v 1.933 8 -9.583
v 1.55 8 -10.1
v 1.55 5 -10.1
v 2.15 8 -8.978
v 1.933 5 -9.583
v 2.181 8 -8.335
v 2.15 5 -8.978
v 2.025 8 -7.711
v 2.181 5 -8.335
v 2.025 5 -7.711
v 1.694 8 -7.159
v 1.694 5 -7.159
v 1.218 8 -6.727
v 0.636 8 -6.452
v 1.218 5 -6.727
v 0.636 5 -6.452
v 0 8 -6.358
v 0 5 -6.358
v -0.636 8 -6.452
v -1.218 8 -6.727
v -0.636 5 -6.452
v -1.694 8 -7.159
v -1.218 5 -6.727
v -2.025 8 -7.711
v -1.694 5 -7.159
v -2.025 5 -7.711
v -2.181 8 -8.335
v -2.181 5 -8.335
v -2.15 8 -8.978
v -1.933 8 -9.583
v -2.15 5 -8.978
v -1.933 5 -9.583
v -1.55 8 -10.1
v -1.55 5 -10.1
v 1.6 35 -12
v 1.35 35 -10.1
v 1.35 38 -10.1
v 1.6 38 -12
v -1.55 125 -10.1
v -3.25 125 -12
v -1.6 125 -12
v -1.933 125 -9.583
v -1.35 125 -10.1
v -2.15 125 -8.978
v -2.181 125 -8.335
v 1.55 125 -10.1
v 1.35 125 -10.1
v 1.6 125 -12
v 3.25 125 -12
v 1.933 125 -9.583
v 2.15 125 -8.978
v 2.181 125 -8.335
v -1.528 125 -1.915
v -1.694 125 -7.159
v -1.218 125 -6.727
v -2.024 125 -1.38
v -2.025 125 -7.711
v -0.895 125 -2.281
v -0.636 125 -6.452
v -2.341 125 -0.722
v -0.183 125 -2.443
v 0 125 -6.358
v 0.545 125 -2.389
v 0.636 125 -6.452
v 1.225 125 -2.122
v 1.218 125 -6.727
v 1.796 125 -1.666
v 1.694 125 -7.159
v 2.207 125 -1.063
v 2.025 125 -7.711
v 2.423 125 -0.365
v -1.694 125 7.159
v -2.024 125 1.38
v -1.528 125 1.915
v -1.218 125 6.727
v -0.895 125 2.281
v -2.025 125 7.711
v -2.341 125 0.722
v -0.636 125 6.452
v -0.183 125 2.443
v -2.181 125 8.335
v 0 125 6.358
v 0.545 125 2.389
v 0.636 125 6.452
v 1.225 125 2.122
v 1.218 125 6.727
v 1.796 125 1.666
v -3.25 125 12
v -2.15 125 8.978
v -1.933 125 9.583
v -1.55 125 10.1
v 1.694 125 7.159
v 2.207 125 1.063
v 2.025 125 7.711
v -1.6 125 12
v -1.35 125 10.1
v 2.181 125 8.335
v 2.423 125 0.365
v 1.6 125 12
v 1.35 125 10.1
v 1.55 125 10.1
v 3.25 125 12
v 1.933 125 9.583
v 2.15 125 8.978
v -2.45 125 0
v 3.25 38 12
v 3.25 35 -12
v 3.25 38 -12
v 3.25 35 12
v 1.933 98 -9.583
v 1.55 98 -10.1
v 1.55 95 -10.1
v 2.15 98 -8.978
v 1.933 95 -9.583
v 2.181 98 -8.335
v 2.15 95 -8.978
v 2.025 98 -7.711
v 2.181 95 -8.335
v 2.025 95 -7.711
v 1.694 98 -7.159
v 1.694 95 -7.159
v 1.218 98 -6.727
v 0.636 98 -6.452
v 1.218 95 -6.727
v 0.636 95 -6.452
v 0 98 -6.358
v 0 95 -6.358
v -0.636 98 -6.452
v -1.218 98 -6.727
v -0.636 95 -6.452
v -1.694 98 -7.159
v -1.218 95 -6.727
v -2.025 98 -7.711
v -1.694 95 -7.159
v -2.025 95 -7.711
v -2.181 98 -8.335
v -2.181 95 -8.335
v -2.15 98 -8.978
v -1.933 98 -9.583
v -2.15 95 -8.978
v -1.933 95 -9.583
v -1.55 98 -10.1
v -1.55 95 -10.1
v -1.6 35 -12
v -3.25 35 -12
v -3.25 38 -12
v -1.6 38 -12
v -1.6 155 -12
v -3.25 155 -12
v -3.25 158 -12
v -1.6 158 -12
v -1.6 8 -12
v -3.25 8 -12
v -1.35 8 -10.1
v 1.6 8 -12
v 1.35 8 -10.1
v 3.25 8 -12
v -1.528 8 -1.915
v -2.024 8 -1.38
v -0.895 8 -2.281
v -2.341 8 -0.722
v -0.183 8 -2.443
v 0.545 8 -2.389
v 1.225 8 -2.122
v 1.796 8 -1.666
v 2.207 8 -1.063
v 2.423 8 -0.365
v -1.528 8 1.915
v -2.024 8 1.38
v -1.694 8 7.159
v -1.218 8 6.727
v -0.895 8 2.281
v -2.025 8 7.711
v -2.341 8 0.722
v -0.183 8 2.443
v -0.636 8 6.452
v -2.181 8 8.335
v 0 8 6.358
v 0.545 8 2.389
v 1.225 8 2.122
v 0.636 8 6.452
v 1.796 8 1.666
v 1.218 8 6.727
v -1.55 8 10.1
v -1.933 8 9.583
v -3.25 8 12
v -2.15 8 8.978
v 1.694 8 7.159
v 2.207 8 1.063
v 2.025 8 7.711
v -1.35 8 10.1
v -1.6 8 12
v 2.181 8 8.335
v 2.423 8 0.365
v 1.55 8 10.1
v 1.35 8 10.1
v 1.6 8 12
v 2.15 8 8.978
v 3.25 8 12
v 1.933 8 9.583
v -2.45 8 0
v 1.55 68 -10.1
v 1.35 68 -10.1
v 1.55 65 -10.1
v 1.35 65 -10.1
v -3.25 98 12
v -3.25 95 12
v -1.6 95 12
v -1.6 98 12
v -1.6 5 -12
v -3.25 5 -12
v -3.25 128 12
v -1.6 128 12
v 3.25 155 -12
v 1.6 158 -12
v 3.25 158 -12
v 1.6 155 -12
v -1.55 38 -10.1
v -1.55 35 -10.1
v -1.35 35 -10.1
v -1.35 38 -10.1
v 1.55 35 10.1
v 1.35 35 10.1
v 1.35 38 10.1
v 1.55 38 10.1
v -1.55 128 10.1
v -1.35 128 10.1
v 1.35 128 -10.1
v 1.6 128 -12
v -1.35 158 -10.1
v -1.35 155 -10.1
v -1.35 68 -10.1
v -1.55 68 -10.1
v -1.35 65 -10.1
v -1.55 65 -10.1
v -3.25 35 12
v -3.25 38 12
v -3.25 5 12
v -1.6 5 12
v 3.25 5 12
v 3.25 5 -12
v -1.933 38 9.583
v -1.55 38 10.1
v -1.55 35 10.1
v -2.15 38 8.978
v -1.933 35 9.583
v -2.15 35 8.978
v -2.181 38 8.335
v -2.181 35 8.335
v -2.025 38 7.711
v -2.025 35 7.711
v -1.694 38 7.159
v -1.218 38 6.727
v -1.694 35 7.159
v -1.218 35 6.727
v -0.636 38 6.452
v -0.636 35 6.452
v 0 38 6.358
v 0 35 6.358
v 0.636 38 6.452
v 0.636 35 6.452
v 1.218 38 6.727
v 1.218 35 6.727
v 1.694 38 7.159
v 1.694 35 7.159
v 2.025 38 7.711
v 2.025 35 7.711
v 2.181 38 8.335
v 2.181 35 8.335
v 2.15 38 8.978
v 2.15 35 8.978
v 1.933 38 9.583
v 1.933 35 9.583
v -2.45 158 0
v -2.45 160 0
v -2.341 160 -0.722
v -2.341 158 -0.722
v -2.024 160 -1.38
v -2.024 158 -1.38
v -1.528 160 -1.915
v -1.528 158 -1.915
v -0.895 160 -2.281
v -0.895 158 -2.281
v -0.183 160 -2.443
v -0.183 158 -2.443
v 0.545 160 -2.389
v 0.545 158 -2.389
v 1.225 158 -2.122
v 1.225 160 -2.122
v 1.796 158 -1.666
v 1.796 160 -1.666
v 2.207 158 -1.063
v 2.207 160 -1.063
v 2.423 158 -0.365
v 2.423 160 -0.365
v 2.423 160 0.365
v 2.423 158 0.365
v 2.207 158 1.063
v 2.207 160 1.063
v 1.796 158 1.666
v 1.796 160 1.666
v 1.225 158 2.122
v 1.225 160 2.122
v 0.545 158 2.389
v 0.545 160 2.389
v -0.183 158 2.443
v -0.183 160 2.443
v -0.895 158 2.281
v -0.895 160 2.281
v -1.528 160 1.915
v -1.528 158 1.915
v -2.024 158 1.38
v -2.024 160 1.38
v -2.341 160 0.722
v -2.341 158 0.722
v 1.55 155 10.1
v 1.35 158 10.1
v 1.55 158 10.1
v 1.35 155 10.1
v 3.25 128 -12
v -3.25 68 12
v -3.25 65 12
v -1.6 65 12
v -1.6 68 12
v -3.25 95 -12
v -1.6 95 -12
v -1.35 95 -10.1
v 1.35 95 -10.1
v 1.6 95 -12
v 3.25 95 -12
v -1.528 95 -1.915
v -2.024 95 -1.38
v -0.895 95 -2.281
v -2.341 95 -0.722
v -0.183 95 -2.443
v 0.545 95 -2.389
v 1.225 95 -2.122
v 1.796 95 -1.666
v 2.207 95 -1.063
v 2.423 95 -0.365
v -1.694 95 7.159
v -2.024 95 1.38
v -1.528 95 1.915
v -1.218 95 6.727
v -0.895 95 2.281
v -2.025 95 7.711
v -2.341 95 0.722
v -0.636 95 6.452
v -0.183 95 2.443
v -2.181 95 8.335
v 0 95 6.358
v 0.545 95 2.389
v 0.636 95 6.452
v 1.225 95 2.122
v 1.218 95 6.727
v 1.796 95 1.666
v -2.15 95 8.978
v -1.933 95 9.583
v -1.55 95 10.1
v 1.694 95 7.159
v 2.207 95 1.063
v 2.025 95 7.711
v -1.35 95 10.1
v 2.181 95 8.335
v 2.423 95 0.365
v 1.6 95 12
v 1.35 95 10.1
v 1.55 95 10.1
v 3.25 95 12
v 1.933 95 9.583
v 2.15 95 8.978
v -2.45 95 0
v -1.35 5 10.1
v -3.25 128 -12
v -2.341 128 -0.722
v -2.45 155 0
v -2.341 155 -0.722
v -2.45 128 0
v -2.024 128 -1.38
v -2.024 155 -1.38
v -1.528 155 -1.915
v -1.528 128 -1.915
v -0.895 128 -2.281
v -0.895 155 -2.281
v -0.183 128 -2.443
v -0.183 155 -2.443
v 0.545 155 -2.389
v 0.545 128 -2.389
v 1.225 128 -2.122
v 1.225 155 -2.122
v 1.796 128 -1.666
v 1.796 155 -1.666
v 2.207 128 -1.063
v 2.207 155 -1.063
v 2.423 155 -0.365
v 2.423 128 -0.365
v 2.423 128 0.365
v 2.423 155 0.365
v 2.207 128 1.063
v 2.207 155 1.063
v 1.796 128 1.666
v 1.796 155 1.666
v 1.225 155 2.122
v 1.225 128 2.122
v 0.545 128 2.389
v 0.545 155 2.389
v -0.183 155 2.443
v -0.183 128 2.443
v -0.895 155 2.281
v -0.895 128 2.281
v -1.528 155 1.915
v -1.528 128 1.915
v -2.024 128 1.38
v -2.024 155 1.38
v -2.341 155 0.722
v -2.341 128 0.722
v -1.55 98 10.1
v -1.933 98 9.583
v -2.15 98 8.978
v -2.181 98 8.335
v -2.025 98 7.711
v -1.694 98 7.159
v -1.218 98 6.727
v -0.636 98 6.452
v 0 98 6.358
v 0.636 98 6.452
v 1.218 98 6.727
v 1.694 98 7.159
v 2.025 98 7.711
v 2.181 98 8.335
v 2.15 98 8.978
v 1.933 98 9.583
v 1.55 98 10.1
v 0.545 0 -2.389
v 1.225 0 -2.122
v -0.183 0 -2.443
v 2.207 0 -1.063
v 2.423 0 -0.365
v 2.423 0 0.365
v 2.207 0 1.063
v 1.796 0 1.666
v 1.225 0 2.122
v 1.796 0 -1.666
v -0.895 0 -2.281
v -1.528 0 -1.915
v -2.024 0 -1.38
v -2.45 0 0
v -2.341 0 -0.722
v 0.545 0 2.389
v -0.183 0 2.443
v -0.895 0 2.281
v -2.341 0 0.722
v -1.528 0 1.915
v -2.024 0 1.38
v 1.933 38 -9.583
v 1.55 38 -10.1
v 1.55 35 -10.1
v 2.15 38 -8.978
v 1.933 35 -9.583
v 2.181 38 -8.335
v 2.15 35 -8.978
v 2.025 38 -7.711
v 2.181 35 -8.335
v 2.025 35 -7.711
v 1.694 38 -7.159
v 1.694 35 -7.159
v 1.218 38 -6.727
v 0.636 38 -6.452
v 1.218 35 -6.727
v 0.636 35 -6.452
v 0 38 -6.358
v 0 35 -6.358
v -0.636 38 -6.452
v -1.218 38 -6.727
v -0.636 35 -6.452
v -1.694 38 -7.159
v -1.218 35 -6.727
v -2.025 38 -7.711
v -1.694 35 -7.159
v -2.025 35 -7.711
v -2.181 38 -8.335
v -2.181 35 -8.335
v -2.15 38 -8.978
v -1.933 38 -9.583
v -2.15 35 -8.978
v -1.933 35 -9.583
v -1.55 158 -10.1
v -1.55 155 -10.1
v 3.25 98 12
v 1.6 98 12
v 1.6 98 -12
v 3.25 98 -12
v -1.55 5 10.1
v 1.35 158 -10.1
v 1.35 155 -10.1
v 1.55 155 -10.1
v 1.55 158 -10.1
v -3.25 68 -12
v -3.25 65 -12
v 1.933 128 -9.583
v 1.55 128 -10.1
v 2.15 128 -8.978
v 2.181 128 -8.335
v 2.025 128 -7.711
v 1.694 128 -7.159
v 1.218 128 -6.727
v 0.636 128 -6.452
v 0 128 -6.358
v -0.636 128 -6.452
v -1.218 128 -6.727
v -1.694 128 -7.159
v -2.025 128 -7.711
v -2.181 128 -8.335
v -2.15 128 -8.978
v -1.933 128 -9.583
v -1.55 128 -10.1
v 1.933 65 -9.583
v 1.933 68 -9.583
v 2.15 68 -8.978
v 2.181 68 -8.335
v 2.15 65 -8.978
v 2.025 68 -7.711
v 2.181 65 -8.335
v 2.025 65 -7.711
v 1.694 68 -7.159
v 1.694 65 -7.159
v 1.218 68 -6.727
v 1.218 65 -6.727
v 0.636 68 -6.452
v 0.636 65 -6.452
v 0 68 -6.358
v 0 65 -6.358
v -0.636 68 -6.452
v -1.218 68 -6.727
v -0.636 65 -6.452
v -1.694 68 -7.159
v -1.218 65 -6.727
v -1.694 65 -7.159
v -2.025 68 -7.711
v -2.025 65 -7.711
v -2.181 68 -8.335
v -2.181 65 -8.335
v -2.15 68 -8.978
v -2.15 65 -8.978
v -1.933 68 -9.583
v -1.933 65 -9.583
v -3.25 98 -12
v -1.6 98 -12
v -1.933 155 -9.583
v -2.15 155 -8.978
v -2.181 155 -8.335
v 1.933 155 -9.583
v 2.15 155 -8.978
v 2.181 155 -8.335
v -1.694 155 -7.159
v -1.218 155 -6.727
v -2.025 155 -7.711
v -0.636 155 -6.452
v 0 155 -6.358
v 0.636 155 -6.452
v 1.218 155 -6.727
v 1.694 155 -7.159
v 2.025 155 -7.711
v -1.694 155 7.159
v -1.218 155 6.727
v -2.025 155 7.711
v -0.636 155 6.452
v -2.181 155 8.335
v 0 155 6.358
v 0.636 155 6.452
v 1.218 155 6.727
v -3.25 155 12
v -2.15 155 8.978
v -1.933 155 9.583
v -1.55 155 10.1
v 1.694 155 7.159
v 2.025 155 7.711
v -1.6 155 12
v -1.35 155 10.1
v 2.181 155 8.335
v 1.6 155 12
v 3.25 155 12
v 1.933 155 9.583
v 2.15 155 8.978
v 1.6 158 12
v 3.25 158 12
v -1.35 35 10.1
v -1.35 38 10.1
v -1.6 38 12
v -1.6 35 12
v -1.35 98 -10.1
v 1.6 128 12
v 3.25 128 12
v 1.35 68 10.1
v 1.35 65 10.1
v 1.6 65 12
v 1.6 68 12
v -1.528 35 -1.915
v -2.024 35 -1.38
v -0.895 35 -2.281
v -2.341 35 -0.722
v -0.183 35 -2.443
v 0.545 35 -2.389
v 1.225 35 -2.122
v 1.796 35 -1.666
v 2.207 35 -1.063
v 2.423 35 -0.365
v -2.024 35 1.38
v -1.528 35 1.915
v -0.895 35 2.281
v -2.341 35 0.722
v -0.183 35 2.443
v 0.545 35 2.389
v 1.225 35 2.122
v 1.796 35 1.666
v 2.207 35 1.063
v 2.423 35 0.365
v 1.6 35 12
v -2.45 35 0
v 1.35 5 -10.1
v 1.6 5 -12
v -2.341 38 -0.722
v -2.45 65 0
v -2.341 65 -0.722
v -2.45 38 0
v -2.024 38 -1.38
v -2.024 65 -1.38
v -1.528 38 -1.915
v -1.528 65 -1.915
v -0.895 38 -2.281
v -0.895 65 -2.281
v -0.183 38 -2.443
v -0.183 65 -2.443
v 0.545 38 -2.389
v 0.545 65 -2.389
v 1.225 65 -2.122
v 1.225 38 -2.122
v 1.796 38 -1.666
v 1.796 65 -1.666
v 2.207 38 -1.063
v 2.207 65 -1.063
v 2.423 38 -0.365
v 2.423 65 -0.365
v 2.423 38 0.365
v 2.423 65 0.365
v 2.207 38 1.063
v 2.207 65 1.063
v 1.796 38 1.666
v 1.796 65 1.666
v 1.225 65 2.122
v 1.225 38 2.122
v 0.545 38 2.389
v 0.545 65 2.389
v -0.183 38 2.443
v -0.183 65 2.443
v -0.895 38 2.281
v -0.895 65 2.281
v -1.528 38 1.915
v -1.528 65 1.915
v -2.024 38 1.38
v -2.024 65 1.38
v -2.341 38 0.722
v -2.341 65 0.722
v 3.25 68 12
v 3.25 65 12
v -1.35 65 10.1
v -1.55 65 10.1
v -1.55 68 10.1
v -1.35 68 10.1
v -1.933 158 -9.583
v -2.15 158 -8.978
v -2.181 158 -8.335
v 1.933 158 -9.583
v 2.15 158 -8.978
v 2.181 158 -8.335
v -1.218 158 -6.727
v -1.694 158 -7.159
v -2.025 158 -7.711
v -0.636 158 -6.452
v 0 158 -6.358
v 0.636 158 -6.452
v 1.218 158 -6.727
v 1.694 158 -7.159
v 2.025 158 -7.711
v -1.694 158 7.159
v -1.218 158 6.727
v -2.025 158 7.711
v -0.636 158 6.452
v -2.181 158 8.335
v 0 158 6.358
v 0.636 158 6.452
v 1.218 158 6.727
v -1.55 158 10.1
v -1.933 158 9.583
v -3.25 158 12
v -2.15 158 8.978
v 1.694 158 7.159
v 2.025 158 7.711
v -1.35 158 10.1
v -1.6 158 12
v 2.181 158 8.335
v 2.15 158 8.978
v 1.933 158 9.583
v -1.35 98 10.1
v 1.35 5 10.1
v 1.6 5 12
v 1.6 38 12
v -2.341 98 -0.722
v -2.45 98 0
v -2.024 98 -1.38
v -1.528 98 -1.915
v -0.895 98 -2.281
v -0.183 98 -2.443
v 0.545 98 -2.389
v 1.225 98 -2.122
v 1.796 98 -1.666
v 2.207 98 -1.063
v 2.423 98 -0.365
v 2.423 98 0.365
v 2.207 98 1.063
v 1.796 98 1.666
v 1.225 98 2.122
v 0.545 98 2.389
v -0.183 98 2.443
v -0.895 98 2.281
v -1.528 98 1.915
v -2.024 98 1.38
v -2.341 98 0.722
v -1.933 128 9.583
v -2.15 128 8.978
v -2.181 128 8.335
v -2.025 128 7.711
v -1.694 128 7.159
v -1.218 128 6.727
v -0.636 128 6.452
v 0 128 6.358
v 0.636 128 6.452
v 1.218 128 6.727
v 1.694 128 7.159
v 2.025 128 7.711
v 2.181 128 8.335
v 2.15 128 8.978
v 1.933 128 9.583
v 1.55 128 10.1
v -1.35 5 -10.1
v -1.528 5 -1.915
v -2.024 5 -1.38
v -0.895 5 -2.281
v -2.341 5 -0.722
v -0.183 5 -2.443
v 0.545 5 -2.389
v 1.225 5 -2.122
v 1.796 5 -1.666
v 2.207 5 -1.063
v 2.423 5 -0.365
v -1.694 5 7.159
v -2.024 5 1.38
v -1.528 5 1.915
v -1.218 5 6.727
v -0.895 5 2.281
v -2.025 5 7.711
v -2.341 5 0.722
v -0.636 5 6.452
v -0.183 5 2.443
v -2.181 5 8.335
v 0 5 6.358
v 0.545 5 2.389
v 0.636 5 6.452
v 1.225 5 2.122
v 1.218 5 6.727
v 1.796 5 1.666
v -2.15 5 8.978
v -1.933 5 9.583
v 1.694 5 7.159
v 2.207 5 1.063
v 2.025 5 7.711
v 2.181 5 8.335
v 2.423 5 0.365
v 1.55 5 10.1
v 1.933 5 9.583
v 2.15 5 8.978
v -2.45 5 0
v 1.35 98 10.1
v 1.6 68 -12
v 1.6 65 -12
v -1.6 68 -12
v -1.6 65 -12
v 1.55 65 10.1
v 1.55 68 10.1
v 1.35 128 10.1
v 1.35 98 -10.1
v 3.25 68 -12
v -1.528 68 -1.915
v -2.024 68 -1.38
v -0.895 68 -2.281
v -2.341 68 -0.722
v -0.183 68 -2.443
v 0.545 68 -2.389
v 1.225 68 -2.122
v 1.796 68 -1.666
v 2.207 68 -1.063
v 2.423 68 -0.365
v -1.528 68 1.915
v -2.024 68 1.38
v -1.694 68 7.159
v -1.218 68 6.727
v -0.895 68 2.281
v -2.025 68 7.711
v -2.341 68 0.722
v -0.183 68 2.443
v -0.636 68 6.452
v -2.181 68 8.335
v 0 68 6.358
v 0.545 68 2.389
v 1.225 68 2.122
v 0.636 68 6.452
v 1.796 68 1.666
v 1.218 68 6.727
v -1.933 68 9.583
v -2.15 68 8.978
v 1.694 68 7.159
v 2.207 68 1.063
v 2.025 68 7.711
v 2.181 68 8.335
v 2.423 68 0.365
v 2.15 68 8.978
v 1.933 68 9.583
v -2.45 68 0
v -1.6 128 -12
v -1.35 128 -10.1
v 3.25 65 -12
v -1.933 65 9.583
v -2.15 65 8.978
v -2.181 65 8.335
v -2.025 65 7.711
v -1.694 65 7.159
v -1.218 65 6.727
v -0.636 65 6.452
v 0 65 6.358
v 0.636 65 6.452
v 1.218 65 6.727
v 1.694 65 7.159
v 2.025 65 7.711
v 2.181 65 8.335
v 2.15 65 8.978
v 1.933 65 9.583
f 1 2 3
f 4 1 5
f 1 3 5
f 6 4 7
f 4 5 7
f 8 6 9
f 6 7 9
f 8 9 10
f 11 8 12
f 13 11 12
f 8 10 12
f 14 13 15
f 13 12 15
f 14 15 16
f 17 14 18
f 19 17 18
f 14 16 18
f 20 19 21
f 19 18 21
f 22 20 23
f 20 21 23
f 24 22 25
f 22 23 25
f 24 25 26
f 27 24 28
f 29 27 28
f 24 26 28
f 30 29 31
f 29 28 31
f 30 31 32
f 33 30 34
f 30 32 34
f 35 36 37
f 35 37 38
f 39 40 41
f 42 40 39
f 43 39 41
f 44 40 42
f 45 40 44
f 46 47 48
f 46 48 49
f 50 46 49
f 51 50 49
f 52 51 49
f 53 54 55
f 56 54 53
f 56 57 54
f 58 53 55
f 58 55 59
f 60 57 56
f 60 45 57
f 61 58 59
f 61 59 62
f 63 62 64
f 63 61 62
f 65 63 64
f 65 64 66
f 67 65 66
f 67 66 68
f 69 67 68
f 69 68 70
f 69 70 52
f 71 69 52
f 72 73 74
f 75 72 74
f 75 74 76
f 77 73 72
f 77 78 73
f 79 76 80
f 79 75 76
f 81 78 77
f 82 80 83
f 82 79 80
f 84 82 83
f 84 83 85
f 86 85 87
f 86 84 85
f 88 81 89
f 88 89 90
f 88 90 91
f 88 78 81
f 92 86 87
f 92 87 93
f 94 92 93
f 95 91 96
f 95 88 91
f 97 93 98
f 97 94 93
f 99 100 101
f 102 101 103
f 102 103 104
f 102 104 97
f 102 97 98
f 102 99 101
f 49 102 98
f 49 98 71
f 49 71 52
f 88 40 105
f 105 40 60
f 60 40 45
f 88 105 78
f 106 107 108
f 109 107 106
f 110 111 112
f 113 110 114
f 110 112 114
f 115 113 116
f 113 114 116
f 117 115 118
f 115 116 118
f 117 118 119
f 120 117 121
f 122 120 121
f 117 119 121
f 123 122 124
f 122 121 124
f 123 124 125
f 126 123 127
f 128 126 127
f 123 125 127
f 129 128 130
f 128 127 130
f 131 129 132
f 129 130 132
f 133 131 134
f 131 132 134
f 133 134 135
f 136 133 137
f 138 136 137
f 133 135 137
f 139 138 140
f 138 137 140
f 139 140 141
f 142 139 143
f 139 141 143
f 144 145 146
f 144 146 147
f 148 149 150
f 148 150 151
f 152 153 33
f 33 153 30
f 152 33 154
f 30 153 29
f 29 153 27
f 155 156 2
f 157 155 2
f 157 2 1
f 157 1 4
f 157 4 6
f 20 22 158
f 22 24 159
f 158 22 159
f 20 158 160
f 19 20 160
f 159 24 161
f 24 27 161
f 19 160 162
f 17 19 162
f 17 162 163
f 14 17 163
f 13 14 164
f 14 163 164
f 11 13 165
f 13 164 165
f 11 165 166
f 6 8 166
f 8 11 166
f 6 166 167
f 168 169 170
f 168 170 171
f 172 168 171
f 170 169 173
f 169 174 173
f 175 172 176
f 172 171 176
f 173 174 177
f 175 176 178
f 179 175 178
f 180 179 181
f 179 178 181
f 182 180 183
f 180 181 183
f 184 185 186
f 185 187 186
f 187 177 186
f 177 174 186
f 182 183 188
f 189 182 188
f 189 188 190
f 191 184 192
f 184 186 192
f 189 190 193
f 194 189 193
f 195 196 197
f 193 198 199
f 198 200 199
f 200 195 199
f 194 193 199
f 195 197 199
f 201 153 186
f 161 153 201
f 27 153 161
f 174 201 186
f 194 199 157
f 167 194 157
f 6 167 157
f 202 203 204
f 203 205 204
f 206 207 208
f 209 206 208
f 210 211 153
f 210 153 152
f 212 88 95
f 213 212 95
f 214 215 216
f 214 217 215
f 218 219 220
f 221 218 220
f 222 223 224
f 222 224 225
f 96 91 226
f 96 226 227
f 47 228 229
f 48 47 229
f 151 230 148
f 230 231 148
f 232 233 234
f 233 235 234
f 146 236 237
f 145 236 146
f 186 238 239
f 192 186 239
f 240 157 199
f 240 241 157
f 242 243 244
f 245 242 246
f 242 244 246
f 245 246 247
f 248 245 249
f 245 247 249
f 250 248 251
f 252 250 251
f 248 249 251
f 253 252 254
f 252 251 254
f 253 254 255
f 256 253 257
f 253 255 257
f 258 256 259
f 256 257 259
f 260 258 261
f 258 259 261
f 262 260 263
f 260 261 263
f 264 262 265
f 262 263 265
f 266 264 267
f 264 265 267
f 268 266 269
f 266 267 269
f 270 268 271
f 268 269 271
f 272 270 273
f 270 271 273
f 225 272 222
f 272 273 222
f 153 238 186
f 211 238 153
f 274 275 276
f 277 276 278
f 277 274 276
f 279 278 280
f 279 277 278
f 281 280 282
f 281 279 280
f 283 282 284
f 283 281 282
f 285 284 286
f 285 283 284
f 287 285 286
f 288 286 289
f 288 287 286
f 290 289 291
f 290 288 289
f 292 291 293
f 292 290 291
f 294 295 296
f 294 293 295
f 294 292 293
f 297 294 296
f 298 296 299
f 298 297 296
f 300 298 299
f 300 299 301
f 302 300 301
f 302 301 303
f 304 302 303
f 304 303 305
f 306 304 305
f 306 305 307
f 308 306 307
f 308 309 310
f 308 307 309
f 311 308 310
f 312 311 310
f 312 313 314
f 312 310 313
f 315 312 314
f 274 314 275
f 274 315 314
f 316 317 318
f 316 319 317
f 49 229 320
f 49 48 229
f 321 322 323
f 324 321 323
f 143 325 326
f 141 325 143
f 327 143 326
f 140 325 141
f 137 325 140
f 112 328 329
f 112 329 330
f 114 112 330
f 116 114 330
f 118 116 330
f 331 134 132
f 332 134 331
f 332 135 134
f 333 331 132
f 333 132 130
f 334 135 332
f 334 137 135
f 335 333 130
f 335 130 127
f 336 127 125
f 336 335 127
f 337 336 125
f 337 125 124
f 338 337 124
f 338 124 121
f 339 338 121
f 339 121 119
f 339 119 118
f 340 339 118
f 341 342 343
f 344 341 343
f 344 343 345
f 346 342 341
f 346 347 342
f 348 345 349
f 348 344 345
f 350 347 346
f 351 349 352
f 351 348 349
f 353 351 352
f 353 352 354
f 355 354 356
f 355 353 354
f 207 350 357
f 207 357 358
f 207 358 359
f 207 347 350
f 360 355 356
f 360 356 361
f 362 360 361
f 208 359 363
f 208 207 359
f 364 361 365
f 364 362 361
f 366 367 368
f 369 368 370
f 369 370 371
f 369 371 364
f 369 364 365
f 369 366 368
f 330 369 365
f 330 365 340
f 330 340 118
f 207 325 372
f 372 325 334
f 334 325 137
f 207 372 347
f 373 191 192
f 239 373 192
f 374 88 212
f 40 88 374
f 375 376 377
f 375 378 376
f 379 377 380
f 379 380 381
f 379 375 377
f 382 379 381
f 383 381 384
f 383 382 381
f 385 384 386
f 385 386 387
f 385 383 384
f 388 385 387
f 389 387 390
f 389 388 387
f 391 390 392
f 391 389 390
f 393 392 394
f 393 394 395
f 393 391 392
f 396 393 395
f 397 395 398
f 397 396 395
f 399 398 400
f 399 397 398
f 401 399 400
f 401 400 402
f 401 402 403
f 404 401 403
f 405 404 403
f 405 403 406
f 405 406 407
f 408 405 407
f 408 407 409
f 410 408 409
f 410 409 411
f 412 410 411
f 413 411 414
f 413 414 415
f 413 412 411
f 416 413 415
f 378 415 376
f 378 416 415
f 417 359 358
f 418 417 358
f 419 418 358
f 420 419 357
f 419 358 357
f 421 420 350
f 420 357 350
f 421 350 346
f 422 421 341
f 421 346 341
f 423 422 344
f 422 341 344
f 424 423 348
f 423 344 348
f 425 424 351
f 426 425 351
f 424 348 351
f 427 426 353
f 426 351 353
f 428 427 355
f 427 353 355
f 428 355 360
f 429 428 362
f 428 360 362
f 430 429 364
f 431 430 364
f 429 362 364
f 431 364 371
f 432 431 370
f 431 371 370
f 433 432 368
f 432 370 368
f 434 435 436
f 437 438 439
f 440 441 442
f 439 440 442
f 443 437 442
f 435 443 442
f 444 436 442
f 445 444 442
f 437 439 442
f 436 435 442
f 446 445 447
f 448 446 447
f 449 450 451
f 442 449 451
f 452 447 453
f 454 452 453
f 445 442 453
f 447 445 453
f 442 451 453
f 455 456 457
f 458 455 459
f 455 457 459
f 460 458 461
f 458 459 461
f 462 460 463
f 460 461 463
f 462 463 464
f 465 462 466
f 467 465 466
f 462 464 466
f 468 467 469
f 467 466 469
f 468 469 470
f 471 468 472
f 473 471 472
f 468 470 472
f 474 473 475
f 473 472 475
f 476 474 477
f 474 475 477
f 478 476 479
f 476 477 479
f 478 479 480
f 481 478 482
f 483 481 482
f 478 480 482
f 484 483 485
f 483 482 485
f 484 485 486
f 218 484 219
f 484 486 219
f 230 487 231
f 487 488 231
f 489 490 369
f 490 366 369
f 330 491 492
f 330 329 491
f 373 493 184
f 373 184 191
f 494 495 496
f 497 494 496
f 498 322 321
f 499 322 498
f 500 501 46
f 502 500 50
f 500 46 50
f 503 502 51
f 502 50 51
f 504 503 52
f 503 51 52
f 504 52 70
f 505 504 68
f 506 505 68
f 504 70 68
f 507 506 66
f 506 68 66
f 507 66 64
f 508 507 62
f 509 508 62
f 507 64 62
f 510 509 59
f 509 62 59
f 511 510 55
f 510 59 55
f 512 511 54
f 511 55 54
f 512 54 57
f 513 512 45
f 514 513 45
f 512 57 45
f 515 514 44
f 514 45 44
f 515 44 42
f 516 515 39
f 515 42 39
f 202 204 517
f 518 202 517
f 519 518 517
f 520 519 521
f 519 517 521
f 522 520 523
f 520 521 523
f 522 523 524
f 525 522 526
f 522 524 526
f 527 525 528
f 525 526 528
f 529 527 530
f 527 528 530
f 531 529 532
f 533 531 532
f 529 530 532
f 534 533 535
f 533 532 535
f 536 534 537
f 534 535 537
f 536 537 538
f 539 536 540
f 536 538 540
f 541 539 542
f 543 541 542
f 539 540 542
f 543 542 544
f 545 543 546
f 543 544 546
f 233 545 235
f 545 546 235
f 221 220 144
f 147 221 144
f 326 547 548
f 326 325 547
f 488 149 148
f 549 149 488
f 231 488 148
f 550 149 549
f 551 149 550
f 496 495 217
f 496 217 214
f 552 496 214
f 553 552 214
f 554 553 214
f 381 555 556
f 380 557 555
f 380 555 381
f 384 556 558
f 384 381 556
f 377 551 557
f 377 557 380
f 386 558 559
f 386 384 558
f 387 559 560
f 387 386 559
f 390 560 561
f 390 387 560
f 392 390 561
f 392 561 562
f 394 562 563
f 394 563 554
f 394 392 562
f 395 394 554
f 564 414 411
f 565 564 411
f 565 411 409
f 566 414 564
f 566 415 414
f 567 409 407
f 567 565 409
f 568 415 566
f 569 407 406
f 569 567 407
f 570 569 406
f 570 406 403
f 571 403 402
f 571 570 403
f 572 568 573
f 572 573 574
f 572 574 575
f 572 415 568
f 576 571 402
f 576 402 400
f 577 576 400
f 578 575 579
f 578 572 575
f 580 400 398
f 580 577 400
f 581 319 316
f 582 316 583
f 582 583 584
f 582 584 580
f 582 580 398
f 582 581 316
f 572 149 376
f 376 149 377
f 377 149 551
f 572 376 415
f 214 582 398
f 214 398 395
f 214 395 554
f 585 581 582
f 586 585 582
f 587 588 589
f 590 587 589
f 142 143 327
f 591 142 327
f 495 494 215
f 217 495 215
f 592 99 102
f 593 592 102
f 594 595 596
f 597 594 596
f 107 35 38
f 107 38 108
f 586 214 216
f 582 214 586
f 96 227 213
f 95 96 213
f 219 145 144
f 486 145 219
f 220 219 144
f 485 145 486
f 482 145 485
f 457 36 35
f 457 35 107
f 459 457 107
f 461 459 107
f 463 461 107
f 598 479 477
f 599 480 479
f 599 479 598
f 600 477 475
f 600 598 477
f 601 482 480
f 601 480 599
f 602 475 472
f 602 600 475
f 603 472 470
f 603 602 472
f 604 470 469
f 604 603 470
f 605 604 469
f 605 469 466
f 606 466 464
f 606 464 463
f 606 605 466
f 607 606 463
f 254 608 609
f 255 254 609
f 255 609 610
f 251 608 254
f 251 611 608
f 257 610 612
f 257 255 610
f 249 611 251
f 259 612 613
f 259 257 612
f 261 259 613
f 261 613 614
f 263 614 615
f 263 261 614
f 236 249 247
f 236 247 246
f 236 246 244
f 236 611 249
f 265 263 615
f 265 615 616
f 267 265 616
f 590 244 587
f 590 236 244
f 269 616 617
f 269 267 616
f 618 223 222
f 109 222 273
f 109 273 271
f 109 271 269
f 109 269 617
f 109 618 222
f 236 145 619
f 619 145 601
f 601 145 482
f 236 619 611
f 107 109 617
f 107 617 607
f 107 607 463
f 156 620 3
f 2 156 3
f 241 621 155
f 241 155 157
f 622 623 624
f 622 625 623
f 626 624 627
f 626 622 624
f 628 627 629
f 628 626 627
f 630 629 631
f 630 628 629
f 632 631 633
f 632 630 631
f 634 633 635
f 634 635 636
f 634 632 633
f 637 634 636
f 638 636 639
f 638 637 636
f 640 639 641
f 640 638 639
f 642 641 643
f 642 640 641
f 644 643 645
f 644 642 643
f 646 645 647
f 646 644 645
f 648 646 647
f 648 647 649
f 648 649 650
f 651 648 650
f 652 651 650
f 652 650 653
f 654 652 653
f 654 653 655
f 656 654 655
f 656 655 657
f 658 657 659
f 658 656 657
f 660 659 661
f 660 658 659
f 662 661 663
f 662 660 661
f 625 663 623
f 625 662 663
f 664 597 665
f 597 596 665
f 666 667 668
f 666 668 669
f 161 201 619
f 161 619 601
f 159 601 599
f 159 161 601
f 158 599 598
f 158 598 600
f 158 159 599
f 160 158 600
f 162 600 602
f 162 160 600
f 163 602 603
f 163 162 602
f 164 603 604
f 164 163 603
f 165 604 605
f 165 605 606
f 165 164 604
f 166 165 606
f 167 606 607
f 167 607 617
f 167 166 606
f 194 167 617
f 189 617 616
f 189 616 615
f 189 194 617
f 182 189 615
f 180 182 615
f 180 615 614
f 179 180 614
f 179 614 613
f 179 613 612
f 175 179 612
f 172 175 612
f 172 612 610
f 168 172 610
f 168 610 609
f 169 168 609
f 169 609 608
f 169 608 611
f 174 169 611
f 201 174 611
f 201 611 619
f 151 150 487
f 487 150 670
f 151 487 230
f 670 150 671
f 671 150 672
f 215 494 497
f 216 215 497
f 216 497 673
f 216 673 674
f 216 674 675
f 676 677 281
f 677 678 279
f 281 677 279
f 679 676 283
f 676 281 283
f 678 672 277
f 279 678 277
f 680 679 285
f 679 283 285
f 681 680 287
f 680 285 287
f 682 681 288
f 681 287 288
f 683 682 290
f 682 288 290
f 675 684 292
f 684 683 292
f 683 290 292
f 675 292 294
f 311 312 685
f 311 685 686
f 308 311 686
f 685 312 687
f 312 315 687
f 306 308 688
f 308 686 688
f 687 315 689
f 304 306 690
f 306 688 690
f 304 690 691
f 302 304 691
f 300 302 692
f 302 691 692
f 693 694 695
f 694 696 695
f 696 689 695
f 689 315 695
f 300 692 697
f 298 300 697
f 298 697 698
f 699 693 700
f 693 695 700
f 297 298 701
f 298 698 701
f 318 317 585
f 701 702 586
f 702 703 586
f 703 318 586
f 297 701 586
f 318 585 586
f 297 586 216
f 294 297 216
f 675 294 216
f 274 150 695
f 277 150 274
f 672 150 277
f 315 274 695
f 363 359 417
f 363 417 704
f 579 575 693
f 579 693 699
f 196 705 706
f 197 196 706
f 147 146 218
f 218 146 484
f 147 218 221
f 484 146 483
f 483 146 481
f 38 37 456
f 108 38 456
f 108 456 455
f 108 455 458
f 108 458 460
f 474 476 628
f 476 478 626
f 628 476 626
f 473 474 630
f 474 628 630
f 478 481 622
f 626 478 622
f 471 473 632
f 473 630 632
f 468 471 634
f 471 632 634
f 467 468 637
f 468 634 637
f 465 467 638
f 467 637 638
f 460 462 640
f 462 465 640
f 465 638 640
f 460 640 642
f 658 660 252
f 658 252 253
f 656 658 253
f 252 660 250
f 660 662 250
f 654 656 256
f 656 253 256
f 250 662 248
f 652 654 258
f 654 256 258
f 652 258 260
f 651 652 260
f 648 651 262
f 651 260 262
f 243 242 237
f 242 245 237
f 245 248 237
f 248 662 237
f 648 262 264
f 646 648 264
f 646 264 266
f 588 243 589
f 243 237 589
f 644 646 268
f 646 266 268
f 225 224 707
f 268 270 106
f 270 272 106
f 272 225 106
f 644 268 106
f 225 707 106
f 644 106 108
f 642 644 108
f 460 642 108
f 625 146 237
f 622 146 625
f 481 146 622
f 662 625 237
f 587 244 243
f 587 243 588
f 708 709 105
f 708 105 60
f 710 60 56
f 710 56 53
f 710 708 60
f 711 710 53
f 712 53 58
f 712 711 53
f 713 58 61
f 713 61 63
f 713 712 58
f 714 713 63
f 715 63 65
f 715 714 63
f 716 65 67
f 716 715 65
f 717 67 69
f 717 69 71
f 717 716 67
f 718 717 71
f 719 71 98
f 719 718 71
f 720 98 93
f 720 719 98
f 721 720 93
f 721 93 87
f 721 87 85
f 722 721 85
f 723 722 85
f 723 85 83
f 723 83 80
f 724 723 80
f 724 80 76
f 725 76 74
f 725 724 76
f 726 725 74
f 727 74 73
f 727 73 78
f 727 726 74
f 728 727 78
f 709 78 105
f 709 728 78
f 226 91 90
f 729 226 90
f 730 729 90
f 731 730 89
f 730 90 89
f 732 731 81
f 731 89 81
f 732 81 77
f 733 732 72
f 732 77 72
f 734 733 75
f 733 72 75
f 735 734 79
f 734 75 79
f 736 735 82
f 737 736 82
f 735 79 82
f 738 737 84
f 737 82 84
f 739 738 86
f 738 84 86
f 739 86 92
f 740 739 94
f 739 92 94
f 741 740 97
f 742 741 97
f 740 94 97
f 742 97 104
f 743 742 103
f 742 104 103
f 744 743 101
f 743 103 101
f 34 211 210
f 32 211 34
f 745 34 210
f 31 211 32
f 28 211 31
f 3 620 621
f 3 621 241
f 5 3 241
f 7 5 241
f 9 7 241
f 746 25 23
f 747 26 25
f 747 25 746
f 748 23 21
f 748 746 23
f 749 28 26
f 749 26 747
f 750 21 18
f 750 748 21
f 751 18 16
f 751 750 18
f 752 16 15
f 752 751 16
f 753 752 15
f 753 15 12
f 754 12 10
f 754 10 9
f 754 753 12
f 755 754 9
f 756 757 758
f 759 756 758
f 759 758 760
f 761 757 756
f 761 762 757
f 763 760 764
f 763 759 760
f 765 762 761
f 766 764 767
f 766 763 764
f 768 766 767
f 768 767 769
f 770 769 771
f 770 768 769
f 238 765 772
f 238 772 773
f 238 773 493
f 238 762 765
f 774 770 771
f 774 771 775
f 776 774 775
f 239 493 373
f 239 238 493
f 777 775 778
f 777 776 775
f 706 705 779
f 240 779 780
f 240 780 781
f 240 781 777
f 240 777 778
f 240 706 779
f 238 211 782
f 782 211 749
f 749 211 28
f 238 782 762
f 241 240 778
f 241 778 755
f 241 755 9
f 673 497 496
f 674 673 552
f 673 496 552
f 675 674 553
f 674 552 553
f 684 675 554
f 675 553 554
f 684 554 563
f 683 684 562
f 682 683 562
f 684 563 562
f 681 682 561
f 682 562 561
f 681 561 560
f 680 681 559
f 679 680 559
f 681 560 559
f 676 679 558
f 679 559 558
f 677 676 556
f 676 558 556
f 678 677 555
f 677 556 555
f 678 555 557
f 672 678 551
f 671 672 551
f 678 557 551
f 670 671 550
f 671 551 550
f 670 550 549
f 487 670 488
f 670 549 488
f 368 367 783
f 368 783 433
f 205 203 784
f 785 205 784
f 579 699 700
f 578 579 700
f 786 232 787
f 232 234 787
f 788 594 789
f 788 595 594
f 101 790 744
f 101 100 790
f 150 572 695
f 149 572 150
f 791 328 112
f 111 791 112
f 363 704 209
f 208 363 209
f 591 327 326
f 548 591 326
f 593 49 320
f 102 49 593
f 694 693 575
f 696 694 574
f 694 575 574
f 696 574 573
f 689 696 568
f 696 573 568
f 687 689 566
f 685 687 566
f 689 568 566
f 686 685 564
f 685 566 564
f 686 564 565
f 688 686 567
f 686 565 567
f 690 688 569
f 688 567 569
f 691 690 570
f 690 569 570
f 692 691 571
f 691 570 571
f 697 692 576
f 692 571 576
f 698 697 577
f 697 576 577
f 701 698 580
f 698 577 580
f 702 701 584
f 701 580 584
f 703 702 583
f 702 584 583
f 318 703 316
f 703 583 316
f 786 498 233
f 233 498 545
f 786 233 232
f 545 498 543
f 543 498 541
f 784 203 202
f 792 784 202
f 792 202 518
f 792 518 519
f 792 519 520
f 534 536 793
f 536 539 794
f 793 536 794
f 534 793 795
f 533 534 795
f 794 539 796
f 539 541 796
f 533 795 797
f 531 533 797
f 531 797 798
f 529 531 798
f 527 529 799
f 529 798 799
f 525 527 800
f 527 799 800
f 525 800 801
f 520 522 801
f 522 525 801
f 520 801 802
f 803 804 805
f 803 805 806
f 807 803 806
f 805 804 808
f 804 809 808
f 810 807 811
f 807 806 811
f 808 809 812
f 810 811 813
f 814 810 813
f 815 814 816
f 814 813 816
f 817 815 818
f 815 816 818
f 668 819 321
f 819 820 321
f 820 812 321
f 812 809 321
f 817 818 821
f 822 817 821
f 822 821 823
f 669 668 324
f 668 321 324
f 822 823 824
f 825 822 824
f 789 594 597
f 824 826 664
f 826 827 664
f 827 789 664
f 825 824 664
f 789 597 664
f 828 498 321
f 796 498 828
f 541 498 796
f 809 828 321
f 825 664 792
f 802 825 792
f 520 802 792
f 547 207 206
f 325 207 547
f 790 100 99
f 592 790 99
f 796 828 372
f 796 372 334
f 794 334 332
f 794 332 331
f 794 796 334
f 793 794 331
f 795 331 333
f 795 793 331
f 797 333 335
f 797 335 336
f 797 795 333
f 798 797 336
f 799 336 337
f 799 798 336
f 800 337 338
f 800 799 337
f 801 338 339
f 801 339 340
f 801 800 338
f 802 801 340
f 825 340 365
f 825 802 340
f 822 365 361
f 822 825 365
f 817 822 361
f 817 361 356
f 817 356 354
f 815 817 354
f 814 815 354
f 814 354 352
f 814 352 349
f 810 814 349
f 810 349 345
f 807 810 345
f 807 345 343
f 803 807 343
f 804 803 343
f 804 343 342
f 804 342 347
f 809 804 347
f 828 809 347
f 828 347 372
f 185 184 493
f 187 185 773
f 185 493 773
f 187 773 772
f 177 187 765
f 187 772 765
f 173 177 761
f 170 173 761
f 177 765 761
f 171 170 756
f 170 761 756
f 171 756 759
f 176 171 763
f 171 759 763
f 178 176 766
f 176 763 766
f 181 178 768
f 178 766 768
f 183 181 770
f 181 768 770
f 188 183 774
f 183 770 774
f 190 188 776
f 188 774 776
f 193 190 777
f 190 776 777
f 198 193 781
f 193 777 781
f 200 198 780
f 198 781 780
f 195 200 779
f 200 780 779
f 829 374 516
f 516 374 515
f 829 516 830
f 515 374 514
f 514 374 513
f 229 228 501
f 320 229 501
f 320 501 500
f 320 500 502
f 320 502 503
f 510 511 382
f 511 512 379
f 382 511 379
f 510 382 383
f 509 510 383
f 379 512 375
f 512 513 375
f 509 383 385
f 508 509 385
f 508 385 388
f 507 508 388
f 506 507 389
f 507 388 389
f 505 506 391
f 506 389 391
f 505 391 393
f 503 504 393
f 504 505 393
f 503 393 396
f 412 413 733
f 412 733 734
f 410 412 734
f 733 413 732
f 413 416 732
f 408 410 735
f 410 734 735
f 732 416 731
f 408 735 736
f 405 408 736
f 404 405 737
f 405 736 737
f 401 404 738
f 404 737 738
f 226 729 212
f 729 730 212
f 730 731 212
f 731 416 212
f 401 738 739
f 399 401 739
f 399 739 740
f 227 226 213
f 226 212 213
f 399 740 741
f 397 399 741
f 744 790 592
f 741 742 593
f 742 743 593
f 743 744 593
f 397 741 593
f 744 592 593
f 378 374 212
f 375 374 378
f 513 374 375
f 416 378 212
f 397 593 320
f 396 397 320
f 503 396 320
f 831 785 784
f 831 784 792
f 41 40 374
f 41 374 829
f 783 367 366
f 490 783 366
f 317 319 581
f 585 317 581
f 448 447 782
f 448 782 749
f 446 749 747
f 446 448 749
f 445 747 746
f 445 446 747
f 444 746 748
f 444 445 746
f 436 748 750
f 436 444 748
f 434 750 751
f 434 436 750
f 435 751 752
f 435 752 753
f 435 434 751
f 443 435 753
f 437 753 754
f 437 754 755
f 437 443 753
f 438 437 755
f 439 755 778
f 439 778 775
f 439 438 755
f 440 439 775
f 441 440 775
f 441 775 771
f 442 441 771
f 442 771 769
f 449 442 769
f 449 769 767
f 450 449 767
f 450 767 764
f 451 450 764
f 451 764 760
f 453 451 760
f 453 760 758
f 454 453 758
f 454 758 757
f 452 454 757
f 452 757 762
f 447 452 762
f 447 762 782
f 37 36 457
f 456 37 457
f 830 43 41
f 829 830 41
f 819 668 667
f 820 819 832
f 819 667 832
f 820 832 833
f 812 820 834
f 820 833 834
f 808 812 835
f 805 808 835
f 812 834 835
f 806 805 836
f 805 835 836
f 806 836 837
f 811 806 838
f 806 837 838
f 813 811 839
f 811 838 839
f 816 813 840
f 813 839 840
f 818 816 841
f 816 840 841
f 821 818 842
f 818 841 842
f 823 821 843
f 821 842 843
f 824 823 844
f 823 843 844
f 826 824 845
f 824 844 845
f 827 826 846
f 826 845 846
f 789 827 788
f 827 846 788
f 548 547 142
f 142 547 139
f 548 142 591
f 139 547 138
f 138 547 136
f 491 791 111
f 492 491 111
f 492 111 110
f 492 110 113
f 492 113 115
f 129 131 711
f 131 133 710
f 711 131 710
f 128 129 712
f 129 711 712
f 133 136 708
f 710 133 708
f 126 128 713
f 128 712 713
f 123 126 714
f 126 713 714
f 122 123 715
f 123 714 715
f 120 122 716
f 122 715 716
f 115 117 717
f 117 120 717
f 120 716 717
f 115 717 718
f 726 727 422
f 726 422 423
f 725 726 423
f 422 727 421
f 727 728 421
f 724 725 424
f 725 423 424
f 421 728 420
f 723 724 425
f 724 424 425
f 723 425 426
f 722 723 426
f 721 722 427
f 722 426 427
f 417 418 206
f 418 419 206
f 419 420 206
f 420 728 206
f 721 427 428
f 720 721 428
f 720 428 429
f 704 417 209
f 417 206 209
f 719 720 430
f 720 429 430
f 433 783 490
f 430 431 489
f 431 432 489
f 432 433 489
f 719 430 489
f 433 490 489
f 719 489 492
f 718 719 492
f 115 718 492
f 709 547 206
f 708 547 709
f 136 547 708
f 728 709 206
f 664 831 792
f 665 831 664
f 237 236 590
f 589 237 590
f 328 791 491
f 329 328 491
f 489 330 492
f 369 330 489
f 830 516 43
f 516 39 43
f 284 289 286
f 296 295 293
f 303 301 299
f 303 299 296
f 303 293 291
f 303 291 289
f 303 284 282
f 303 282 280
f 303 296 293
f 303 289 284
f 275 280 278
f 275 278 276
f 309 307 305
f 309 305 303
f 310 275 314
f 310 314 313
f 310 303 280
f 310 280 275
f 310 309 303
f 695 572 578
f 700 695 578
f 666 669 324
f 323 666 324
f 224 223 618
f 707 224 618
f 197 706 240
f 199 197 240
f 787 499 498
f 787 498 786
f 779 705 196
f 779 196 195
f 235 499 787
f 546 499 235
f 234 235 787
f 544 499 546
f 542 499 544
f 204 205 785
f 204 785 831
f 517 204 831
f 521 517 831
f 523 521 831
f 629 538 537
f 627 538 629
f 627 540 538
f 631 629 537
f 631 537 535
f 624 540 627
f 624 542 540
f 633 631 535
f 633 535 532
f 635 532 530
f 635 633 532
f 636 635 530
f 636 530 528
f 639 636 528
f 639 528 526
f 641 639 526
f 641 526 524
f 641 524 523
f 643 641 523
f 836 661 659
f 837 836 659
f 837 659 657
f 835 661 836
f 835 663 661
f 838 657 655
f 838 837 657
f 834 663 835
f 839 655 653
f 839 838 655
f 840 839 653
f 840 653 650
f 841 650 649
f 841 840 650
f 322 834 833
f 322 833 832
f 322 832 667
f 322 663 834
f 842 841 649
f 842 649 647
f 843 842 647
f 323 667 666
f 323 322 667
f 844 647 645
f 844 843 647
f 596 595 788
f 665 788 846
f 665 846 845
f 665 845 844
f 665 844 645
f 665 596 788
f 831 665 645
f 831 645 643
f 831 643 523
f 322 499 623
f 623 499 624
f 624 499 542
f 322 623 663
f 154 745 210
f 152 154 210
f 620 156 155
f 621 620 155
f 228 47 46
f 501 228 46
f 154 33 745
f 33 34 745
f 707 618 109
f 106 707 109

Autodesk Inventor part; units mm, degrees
ref_plane "YZ Plane" through (0, 0, 0) normal (1, 0, 0) x (0, 1, 0)
ref_plane "XZ Plane" through (0, 0, 0) normal (0, 1, 0) x (-1, 0, 0)
sketch "草圖1" plane through (0, 0, 0) normal (0, 1, 0) x (-1, 0, 0)
  circle A0 centre (0, 0) radius 2.45
  dimension "d0" = 4.9
extrude "擠出1" add sketch "草圖1" along normal blind 160
ref_plane "工作平面1" through (0, 5, 0) normal (0, -1, 0) x (1, 0, 0)
sketch "草圖3" plane through (0, 5, 0) normal (0, -1, 0) x (1, 0, 0)
  circle A0 centre (0, 0) radius 2.45 projected
  circle A1 centre (0, 0) radius 3.25
  line L0 (3.25, 0) -> (-3.25, 0)
  line L1 (-3.25, 0) -> (-3.25, -12)
  line L2 (-3.25, -12) -> (3.25, -12)
  line L3 (3.25, -12) -> (3.25, 0)
  line L4 (1.6, -12) -> (-1.6, -12)
  line L5 (-1.6, -12) -> (-1.6, -7)
  line L6 (-1.6, -7) -> (1.6, -7)
  line L7 (1.6, -7) -> (1.6, -12)
  line L8 (1.55, -7) -> (-1.55, -7)
  line L9 (-1.55, -7) -> (-1.55, -10.1)
  line L10 (-1.55, -10.1) -> (1.55, -10.1)
  line L11 (1.55, -10.1) -> (1.55, -7)
  line L12 (1.55, -10.1) -> (1.35, -10.1)
  line L13 (1.35, -10.1) -> (1.6, -12)
  line L14 (-1.55, -10.1) -> (-1.35, -10.1)
  line L15 (-1.35, -10.1) -> (-1.6, -12)
  circle A2 centre (0, -8.55) radius 2.192
  line L16 (-3.25, 0) -> (-3.25, 12)
  line L17 (-3.25, 12) -> (3.25, 12)
  line L18 (3.25, 12) -> (3.25, 0)
  line L19 (1.6, 12) -> (-1.6, 12)
  line L20 (-1.6, 12) -> (-1.6, 7)
  line L21 (-1.6, 7) -> (1.6, 7)
  line L22 (1.6, 7) -> (1.6, 12)
  line L23 (1.55, 7) -> (-1.55, 7)
  line L24 (-1.55, 7) -> (-1.55, 10.1)
  line L25 (-1.55, 10.1) -> (1.55, 10.1)
  line L26 (1.55, 10.1) -> (1.55, 7)
  line L27 (1.55, 10.1) -> (1.35, 10.1)
  line L28 (1.35, 10.1) -> (1.6, 12)
  line L29 (-1.55, 10.1) -> (-1.35, 10.1)
  line L30 (-1.35, 10.1) -> (-1.6, 12)
  circle A3 centre (0, 8.55) radius 2.192
  point P0 (0, -12)
  point P1 (0, -12)
  point P2 (0, -7)
  point P3 (-1.55, -7)
  point P4 (1.55, -7)
  point P5 (-1.55, -8.55)
  point P6 (-1.3711, -10.2603)
  point P7 (1.3711, -10.2603)
  point P8 (0, 12)
  point P9 (0, 12)
  point P10 (0, 7)
  point P11 (-1.55, 8.55)
  point P12 (1.3711, 10.2603)
  point P13 (-1.3711, 10.2603)
  point P14 (0.9915, 3.095)
  point P15 (-0.9915, 3.095)
  point P16 (-1.55, 10.1)
  point P17 (-1.55, -10.1)
  point P18 (-1.55, -10.1)
  dimension "d17" = 6.5
  dimension "d9" = 12
  dimension "d11" = 5
  dimension "d12" = 3.2
  dimension "d13" = 3.1
  dimension "d14" = 3.1
  dimension "d15" = 0.2
  dimension "d16" = 0.2
  dimension "d18" = 6.5
extrude "擠出3" add sketch "草圖3" against normal blind 3 contours L0 A1 A0 | A0 L0 A1 | L3 L2 L7 A2 L6 L5 L1 A1 | A1 L16 L17 L20 A3 L21 L22 L18 | L13 A2 L7 | L22 A3 L28 | L5 A2 L15 | L30 A3 L20 | L13 L10 A2 | A3 L25 L28 | A2 L10 L15 | L30 L25 A3 | A2 L6 L7 | L22 L21 A3 | L5 L6 A2 | A3 L21 L20
pattern_linear "矩形陣列1" count 6 spacing 30 along (0, 1, 0) of "擠出3"
properties part number "[3DP]double_bar"
